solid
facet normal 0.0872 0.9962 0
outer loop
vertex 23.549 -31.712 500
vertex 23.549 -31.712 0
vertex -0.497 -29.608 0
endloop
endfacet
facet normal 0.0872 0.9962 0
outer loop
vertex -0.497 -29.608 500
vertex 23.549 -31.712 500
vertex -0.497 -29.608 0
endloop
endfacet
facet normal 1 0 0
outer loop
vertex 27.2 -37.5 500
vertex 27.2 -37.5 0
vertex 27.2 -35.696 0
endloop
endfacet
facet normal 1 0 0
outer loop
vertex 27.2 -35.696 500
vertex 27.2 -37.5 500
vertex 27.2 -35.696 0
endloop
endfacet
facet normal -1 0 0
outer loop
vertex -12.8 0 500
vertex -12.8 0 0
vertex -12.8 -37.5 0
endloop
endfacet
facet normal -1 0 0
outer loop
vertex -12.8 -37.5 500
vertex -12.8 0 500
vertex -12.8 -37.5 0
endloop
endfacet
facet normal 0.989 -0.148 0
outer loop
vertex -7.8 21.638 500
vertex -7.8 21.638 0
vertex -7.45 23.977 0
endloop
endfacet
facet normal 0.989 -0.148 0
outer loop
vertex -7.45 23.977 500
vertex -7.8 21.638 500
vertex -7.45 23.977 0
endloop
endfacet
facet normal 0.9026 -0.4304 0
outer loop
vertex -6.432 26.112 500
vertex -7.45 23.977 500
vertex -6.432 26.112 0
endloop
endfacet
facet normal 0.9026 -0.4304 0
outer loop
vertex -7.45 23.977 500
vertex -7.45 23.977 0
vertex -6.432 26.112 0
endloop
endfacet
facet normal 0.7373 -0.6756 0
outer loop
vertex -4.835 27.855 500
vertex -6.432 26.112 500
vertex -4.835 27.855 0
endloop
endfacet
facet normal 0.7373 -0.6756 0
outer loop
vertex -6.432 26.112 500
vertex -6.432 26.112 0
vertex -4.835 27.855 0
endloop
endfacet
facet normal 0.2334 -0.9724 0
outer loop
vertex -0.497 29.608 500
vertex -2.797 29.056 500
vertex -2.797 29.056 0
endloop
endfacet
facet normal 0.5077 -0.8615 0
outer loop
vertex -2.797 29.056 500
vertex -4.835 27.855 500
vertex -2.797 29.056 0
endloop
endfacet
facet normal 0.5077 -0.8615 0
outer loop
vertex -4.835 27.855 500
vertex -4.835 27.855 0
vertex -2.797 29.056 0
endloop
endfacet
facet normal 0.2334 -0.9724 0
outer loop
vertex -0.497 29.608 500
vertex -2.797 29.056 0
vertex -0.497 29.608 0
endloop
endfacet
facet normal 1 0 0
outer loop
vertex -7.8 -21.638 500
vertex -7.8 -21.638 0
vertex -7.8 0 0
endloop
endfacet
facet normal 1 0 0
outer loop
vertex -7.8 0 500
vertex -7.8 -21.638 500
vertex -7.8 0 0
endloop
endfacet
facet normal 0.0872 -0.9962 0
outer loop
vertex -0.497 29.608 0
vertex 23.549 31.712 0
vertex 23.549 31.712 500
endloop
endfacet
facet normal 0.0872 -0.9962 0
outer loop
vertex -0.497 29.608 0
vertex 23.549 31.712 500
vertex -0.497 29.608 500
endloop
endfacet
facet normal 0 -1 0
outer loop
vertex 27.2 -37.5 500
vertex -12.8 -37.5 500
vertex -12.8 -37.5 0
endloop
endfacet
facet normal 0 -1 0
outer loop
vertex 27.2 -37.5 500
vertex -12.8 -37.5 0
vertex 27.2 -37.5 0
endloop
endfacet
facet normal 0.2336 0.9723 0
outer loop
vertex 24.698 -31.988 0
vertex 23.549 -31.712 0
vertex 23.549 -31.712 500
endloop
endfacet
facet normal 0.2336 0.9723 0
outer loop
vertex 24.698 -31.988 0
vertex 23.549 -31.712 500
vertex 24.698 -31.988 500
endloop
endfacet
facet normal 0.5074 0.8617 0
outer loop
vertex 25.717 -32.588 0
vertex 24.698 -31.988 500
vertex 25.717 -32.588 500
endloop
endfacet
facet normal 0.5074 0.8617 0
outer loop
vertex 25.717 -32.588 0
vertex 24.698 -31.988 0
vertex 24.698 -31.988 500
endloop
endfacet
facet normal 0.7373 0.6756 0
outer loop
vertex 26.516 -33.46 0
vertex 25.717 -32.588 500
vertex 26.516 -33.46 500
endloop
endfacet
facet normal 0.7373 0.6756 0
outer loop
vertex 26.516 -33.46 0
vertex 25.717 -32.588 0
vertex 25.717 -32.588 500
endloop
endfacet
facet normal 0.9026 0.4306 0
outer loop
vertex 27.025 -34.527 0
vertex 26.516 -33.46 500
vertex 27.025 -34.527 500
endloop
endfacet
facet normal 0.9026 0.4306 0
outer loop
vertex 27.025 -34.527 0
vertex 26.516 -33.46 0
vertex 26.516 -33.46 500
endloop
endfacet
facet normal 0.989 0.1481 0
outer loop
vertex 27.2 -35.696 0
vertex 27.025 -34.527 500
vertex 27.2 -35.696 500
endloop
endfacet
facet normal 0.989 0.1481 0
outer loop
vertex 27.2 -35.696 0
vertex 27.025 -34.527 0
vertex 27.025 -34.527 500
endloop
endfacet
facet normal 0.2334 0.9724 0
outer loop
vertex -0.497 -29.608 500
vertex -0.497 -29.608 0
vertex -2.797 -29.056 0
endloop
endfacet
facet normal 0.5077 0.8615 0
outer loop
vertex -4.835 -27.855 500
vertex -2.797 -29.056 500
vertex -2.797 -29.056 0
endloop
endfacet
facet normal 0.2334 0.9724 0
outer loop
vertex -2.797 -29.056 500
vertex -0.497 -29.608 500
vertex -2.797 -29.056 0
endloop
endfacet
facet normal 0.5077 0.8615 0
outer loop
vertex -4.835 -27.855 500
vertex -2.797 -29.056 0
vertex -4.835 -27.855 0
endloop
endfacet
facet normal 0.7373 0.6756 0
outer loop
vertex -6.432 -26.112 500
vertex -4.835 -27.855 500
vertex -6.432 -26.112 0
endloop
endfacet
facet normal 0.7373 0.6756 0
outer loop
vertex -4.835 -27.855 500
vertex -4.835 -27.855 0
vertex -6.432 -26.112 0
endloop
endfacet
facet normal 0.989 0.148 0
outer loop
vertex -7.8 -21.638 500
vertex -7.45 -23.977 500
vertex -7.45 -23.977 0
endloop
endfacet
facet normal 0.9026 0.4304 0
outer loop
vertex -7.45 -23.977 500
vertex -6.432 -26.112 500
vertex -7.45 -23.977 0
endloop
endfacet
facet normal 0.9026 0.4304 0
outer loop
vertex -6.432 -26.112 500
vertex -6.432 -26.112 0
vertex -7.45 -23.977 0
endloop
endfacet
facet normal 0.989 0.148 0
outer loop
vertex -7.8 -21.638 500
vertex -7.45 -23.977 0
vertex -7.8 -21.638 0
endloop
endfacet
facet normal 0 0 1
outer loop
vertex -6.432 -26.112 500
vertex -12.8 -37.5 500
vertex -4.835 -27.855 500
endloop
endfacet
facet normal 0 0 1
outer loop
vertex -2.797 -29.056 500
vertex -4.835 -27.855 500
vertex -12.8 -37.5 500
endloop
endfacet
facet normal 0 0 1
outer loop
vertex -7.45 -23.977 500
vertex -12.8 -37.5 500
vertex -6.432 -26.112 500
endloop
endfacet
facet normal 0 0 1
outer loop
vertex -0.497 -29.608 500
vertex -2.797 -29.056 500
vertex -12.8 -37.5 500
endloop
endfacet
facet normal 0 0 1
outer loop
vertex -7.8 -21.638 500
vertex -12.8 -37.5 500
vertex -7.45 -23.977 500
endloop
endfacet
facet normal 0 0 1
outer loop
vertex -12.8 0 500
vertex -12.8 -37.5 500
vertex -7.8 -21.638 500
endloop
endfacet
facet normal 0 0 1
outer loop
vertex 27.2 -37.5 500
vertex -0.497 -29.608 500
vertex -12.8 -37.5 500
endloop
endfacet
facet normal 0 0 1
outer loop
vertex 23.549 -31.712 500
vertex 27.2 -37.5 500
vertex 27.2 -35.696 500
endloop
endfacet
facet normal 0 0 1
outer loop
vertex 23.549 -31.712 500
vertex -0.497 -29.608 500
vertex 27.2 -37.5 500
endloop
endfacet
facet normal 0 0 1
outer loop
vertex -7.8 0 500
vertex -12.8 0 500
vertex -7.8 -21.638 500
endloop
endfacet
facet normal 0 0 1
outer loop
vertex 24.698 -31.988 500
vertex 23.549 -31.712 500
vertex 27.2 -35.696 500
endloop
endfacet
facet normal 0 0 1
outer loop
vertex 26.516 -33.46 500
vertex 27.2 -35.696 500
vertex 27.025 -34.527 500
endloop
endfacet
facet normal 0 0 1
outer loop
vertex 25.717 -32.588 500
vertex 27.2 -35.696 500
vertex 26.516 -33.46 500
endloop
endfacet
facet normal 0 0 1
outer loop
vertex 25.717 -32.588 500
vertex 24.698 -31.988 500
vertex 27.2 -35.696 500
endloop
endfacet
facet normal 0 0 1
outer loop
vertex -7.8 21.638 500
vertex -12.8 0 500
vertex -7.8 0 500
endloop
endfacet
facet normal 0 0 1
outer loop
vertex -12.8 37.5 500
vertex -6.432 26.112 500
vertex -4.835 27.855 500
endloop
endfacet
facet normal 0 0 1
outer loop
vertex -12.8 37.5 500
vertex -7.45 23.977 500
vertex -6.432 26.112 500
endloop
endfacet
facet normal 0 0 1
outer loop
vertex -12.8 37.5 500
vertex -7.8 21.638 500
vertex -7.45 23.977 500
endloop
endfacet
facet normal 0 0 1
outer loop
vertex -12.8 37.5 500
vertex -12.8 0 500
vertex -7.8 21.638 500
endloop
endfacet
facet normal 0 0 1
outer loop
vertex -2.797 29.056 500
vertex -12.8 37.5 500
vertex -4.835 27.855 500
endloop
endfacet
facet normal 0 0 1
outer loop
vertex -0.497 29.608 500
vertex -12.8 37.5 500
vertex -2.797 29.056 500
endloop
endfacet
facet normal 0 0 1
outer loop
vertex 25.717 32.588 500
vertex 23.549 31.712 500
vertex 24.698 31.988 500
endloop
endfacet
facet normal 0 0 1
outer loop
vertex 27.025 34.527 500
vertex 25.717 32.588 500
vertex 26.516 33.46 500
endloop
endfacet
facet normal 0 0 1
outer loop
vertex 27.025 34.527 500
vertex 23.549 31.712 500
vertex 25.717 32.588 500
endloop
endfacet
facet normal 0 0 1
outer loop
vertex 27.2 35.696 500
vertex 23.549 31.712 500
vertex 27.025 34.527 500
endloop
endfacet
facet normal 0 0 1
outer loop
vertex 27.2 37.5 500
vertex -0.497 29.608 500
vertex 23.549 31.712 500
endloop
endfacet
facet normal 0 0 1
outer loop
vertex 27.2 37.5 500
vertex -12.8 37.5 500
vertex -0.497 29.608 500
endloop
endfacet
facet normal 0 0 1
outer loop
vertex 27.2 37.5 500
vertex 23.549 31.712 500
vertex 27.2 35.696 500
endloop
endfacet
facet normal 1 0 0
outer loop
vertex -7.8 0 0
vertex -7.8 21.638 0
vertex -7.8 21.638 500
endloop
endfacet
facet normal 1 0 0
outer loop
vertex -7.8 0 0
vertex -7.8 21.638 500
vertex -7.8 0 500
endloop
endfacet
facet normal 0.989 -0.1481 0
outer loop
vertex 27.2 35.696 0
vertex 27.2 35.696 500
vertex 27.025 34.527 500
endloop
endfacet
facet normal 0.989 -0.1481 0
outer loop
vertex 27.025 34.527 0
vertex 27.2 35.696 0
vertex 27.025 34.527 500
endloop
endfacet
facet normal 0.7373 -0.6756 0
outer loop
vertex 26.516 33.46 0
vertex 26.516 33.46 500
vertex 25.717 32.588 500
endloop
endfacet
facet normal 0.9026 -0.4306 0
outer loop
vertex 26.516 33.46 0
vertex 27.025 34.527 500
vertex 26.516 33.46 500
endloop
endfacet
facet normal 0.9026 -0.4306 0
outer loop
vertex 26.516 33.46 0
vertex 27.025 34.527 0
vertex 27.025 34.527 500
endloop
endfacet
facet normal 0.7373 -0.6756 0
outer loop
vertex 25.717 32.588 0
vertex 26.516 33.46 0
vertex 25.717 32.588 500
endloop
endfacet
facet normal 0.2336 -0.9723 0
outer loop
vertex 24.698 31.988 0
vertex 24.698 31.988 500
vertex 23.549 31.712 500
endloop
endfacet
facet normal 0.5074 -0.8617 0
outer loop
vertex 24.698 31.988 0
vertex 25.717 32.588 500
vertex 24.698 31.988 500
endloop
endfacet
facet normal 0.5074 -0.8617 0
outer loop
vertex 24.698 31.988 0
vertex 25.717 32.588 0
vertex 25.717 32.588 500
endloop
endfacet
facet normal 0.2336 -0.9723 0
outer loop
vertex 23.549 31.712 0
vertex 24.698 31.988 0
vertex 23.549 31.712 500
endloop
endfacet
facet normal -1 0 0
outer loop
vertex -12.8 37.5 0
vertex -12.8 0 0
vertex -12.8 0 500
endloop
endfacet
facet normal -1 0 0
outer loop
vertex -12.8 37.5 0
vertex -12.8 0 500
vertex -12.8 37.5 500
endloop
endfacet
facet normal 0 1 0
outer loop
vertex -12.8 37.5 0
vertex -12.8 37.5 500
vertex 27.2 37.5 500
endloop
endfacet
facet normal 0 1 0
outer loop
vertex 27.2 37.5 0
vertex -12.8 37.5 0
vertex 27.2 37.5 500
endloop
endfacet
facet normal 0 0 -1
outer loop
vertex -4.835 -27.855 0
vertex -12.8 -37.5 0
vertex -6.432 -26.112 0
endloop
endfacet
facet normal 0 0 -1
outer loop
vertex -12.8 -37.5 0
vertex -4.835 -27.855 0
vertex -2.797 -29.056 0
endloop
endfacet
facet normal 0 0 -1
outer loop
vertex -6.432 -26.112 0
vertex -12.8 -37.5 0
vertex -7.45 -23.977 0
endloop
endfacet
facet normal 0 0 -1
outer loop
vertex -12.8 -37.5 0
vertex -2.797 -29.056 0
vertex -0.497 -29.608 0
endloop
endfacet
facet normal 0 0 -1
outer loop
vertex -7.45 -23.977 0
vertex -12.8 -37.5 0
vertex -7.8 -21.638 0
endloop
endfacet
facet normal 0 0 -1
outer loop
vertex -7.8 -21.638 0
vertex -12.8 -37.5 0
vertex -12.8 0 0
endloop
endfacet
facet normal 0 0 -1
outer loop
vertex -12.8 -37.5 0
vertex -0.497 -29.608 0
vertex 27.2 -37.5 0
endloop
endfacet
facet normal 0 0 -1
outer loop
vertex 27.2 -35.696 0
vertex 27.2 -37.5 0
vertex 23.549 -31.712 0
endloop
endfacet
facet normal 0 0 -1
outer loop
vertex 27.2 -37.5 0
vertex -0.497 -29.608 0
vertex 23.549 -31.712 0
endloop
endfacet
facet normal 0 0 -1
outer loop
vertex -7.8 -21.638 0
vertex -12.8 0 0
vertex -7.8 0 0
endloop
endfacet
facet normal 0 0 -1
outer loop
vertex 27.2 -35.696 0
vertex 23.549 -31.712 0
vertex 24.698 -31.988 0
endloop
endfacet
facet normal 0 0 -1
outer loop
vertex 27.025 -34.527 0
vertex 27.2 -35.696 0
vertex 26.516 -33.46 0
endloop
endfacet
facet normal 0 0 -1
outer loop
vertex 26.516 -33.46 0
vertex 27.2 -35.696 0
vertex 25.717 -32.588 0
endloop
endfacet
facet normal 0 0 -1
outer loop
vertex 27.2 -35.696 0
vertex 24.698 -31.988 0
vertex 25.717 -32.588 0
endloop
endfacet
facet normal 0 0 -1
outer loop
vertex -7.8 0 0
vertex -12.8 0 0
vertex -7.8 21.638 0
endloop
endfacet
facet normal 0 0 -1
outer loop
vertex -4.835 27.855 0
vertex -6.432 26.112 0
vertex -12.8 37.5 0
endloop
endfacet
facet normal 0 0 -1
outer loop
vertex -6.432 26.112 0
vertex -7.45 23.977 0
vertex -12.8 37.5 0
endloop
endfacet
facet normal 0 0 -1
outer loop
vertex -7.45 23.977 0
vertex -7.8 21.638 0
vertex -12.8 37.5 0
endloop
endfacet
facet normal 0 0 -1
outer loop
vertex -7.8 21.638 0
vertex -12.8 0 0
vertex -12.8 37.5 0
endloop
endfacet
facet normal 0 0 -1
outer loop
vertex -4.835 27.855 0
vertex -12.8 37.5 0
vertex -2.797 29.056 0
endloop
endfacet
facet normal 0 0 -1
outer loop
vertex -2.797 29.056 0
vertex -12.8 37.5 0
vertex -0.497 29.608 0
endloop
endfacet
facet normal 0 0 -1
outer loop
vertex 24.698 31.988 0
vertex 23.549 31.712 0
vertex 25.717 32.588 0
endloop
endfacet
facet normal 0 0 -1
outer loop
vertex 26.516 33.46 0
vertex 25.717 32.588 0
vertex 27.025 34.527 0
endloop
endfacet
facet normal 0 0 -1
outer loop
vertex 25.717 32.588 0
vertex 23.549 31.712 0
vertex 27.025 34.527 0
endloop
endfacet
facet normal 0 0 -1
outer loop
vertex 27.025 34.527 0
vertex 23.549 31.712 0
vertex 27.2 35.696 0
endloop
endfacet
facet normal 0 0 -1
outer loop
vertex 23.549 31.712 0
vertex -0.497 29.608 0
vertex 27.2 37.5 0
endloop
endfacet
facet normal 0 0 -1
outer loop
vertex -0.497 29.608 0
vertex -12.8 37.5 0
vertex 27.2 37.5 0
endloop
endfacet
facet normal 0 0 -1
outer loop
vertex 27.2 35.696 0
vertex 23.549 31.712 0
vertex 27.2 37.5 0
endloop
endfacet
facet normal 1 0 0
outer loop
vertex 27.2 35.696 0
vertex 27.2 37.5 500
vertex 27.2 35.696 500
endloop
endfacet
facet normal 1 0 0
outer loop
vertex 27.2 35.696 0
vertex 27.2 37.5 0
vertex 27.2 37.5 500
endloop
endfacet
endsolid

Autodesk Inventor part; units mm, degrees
ref_plane "YZ Plane" through (0, 0, 0) normal (1, 0, 0) x (0, 1, 0)
ref_plane "開始平面" through (0, 0, 0) normal (0, 0, 1) x (1, 0, 0)
ref_plane "終了平面" through (0, 0, 500) normal (0, 0, 1) x (1, 0, 0)
sketch "スケッチ" plane through (0, 0, 0) normal (0, 0, 1) x (1, 0, 0)
  line L0 (-12.8, 0) -> (-12.8, 37.5)
  line L1 (-12.8, 37.5) -> (27.2, 37.5)
  line L2 (27.2, 37.5) -> (27.2, 35.6964)
  line L3 (23.5486, 31.7116) -> (-0.4973, 29.6078)
  line L4 (-7.8, 21.6383) -> (-7.8, 0)
  line L5 (-7.8, 0) -> (-12.8, 0) construction
  line L6 (9.7, 37.5) -> (9.7, 30.5) construction
  line L7 (27.2, 32.0311) -> (27.2, 30.5) construction
  line L8 (27.2, 30.5) -> (9.7, 30.5) construction
  line L9 (0, 15) -> (0, -27) construction
  line L10 (-5.539, 0) -> (16.0067, 0) construction
  line L11 (-12.8, 0) -> (-12.8, -37.5)
  line L12 (-12.8, -37.5) -> (27.2, -37.5)
  line L13 (27.2, -37.5) -> (27.2, -35.6964)
  line L14 (23.5486, -31.7116) -> (-0.4973, -29.6078)
  line L15 (-7.8, -21.6383) -> (-7.8, 0)
  arc A0 (-0.4973, 29.6078) -> (-7.8, 21.6383) centre (0.2, 21.6383) ccw
  arc A1 (-7.8, -21.6383) -> (-0.4973, -29.6078) centre (0.2, -21.6383) ccw
  arc A2 (23.5486, 31.7116) -> (27.2, 35.6964) centre (23.2, 35.6964) ccw
  arc A3 (27.2, -35.6964) -> (23.5486, -31.7116) centre (23.2, -35.6964) ccw
  line L16 (0, 52.5) -> (0, -52.5) construction
  line L17 (-20.955, 0) -> (36.1298, 0) construction
  point P0 (-7.8, 28.9689)
  point P1 (27.2, -32.0311)
  point P2 (-7.8, -28.9689)
  point P3 (9.7, -37.5)
  point P4 (9.7, -30.5)
  dimension "d0" = 5
  dimension "d1" = 37.5
  dimension "d2" = 40
  dimension "d3" = 7
  dimension "d4" = 17.5
  dimension "d5" = 1.5311
  dimension "d23" = 8
  dimension "d24" = 4
  dimension "d25" = 12.8
extrude "ボディ" add sketch "スケッチ" along normal up to surface (500 mm away) from surface at 0
sketch "Sketch3" plane through (0, 0, 0) normal (0, 0, 1) x (1, 0, 0)
  line L0 (0, 0) -> (10, 0)
ref_plane "Work Plane3" through (0, 0, 0) normal (0, -1, 0) x (1, 0, 0)
sketch "Sketch4" plane through (0, 0, 0) normal (0, -1, 0) x (1, 0, 0)
  line L0 (-2, 0) -> (12, 0)
  line L1 (-2, 500) -> (12, 500)
  dimension "d29" = 500
equation "\"d0\" = G_T"
equation "\"d1\" = 0.5 * G_H"
equation "\"d2\" = G_W"
equation "\"d3\" = G_T1"
equation "\"d4\" = G_C"
equation "\"d23\" = G_IR"
equation "\"d24\" = G_ER"
equation "\"d25\" = ey"
equation "\"d6\" = G_L"
equation "\"G_W\" = 40"
equation "\"G_H\" = 75"
equation "\"G_T\" = 5"
equation "\"G_T1\" = 7"
equation "\"G_NG\" = 0.08749"
equation "\"G_ER\" = 4"
equation "\"G_IR\" = 8"
equation "\"G_C\" = 17.5"
equation "\"G_L\" = d29"
equation "\"ey\" = 12.8"
equation "\"G_OFFSET_START\" = 0"
equation "\"G_OFFSET_END\" = 0"
properties part number "JIS G 3192 - 75 x 40 x 5 - 500" material "SS400"
